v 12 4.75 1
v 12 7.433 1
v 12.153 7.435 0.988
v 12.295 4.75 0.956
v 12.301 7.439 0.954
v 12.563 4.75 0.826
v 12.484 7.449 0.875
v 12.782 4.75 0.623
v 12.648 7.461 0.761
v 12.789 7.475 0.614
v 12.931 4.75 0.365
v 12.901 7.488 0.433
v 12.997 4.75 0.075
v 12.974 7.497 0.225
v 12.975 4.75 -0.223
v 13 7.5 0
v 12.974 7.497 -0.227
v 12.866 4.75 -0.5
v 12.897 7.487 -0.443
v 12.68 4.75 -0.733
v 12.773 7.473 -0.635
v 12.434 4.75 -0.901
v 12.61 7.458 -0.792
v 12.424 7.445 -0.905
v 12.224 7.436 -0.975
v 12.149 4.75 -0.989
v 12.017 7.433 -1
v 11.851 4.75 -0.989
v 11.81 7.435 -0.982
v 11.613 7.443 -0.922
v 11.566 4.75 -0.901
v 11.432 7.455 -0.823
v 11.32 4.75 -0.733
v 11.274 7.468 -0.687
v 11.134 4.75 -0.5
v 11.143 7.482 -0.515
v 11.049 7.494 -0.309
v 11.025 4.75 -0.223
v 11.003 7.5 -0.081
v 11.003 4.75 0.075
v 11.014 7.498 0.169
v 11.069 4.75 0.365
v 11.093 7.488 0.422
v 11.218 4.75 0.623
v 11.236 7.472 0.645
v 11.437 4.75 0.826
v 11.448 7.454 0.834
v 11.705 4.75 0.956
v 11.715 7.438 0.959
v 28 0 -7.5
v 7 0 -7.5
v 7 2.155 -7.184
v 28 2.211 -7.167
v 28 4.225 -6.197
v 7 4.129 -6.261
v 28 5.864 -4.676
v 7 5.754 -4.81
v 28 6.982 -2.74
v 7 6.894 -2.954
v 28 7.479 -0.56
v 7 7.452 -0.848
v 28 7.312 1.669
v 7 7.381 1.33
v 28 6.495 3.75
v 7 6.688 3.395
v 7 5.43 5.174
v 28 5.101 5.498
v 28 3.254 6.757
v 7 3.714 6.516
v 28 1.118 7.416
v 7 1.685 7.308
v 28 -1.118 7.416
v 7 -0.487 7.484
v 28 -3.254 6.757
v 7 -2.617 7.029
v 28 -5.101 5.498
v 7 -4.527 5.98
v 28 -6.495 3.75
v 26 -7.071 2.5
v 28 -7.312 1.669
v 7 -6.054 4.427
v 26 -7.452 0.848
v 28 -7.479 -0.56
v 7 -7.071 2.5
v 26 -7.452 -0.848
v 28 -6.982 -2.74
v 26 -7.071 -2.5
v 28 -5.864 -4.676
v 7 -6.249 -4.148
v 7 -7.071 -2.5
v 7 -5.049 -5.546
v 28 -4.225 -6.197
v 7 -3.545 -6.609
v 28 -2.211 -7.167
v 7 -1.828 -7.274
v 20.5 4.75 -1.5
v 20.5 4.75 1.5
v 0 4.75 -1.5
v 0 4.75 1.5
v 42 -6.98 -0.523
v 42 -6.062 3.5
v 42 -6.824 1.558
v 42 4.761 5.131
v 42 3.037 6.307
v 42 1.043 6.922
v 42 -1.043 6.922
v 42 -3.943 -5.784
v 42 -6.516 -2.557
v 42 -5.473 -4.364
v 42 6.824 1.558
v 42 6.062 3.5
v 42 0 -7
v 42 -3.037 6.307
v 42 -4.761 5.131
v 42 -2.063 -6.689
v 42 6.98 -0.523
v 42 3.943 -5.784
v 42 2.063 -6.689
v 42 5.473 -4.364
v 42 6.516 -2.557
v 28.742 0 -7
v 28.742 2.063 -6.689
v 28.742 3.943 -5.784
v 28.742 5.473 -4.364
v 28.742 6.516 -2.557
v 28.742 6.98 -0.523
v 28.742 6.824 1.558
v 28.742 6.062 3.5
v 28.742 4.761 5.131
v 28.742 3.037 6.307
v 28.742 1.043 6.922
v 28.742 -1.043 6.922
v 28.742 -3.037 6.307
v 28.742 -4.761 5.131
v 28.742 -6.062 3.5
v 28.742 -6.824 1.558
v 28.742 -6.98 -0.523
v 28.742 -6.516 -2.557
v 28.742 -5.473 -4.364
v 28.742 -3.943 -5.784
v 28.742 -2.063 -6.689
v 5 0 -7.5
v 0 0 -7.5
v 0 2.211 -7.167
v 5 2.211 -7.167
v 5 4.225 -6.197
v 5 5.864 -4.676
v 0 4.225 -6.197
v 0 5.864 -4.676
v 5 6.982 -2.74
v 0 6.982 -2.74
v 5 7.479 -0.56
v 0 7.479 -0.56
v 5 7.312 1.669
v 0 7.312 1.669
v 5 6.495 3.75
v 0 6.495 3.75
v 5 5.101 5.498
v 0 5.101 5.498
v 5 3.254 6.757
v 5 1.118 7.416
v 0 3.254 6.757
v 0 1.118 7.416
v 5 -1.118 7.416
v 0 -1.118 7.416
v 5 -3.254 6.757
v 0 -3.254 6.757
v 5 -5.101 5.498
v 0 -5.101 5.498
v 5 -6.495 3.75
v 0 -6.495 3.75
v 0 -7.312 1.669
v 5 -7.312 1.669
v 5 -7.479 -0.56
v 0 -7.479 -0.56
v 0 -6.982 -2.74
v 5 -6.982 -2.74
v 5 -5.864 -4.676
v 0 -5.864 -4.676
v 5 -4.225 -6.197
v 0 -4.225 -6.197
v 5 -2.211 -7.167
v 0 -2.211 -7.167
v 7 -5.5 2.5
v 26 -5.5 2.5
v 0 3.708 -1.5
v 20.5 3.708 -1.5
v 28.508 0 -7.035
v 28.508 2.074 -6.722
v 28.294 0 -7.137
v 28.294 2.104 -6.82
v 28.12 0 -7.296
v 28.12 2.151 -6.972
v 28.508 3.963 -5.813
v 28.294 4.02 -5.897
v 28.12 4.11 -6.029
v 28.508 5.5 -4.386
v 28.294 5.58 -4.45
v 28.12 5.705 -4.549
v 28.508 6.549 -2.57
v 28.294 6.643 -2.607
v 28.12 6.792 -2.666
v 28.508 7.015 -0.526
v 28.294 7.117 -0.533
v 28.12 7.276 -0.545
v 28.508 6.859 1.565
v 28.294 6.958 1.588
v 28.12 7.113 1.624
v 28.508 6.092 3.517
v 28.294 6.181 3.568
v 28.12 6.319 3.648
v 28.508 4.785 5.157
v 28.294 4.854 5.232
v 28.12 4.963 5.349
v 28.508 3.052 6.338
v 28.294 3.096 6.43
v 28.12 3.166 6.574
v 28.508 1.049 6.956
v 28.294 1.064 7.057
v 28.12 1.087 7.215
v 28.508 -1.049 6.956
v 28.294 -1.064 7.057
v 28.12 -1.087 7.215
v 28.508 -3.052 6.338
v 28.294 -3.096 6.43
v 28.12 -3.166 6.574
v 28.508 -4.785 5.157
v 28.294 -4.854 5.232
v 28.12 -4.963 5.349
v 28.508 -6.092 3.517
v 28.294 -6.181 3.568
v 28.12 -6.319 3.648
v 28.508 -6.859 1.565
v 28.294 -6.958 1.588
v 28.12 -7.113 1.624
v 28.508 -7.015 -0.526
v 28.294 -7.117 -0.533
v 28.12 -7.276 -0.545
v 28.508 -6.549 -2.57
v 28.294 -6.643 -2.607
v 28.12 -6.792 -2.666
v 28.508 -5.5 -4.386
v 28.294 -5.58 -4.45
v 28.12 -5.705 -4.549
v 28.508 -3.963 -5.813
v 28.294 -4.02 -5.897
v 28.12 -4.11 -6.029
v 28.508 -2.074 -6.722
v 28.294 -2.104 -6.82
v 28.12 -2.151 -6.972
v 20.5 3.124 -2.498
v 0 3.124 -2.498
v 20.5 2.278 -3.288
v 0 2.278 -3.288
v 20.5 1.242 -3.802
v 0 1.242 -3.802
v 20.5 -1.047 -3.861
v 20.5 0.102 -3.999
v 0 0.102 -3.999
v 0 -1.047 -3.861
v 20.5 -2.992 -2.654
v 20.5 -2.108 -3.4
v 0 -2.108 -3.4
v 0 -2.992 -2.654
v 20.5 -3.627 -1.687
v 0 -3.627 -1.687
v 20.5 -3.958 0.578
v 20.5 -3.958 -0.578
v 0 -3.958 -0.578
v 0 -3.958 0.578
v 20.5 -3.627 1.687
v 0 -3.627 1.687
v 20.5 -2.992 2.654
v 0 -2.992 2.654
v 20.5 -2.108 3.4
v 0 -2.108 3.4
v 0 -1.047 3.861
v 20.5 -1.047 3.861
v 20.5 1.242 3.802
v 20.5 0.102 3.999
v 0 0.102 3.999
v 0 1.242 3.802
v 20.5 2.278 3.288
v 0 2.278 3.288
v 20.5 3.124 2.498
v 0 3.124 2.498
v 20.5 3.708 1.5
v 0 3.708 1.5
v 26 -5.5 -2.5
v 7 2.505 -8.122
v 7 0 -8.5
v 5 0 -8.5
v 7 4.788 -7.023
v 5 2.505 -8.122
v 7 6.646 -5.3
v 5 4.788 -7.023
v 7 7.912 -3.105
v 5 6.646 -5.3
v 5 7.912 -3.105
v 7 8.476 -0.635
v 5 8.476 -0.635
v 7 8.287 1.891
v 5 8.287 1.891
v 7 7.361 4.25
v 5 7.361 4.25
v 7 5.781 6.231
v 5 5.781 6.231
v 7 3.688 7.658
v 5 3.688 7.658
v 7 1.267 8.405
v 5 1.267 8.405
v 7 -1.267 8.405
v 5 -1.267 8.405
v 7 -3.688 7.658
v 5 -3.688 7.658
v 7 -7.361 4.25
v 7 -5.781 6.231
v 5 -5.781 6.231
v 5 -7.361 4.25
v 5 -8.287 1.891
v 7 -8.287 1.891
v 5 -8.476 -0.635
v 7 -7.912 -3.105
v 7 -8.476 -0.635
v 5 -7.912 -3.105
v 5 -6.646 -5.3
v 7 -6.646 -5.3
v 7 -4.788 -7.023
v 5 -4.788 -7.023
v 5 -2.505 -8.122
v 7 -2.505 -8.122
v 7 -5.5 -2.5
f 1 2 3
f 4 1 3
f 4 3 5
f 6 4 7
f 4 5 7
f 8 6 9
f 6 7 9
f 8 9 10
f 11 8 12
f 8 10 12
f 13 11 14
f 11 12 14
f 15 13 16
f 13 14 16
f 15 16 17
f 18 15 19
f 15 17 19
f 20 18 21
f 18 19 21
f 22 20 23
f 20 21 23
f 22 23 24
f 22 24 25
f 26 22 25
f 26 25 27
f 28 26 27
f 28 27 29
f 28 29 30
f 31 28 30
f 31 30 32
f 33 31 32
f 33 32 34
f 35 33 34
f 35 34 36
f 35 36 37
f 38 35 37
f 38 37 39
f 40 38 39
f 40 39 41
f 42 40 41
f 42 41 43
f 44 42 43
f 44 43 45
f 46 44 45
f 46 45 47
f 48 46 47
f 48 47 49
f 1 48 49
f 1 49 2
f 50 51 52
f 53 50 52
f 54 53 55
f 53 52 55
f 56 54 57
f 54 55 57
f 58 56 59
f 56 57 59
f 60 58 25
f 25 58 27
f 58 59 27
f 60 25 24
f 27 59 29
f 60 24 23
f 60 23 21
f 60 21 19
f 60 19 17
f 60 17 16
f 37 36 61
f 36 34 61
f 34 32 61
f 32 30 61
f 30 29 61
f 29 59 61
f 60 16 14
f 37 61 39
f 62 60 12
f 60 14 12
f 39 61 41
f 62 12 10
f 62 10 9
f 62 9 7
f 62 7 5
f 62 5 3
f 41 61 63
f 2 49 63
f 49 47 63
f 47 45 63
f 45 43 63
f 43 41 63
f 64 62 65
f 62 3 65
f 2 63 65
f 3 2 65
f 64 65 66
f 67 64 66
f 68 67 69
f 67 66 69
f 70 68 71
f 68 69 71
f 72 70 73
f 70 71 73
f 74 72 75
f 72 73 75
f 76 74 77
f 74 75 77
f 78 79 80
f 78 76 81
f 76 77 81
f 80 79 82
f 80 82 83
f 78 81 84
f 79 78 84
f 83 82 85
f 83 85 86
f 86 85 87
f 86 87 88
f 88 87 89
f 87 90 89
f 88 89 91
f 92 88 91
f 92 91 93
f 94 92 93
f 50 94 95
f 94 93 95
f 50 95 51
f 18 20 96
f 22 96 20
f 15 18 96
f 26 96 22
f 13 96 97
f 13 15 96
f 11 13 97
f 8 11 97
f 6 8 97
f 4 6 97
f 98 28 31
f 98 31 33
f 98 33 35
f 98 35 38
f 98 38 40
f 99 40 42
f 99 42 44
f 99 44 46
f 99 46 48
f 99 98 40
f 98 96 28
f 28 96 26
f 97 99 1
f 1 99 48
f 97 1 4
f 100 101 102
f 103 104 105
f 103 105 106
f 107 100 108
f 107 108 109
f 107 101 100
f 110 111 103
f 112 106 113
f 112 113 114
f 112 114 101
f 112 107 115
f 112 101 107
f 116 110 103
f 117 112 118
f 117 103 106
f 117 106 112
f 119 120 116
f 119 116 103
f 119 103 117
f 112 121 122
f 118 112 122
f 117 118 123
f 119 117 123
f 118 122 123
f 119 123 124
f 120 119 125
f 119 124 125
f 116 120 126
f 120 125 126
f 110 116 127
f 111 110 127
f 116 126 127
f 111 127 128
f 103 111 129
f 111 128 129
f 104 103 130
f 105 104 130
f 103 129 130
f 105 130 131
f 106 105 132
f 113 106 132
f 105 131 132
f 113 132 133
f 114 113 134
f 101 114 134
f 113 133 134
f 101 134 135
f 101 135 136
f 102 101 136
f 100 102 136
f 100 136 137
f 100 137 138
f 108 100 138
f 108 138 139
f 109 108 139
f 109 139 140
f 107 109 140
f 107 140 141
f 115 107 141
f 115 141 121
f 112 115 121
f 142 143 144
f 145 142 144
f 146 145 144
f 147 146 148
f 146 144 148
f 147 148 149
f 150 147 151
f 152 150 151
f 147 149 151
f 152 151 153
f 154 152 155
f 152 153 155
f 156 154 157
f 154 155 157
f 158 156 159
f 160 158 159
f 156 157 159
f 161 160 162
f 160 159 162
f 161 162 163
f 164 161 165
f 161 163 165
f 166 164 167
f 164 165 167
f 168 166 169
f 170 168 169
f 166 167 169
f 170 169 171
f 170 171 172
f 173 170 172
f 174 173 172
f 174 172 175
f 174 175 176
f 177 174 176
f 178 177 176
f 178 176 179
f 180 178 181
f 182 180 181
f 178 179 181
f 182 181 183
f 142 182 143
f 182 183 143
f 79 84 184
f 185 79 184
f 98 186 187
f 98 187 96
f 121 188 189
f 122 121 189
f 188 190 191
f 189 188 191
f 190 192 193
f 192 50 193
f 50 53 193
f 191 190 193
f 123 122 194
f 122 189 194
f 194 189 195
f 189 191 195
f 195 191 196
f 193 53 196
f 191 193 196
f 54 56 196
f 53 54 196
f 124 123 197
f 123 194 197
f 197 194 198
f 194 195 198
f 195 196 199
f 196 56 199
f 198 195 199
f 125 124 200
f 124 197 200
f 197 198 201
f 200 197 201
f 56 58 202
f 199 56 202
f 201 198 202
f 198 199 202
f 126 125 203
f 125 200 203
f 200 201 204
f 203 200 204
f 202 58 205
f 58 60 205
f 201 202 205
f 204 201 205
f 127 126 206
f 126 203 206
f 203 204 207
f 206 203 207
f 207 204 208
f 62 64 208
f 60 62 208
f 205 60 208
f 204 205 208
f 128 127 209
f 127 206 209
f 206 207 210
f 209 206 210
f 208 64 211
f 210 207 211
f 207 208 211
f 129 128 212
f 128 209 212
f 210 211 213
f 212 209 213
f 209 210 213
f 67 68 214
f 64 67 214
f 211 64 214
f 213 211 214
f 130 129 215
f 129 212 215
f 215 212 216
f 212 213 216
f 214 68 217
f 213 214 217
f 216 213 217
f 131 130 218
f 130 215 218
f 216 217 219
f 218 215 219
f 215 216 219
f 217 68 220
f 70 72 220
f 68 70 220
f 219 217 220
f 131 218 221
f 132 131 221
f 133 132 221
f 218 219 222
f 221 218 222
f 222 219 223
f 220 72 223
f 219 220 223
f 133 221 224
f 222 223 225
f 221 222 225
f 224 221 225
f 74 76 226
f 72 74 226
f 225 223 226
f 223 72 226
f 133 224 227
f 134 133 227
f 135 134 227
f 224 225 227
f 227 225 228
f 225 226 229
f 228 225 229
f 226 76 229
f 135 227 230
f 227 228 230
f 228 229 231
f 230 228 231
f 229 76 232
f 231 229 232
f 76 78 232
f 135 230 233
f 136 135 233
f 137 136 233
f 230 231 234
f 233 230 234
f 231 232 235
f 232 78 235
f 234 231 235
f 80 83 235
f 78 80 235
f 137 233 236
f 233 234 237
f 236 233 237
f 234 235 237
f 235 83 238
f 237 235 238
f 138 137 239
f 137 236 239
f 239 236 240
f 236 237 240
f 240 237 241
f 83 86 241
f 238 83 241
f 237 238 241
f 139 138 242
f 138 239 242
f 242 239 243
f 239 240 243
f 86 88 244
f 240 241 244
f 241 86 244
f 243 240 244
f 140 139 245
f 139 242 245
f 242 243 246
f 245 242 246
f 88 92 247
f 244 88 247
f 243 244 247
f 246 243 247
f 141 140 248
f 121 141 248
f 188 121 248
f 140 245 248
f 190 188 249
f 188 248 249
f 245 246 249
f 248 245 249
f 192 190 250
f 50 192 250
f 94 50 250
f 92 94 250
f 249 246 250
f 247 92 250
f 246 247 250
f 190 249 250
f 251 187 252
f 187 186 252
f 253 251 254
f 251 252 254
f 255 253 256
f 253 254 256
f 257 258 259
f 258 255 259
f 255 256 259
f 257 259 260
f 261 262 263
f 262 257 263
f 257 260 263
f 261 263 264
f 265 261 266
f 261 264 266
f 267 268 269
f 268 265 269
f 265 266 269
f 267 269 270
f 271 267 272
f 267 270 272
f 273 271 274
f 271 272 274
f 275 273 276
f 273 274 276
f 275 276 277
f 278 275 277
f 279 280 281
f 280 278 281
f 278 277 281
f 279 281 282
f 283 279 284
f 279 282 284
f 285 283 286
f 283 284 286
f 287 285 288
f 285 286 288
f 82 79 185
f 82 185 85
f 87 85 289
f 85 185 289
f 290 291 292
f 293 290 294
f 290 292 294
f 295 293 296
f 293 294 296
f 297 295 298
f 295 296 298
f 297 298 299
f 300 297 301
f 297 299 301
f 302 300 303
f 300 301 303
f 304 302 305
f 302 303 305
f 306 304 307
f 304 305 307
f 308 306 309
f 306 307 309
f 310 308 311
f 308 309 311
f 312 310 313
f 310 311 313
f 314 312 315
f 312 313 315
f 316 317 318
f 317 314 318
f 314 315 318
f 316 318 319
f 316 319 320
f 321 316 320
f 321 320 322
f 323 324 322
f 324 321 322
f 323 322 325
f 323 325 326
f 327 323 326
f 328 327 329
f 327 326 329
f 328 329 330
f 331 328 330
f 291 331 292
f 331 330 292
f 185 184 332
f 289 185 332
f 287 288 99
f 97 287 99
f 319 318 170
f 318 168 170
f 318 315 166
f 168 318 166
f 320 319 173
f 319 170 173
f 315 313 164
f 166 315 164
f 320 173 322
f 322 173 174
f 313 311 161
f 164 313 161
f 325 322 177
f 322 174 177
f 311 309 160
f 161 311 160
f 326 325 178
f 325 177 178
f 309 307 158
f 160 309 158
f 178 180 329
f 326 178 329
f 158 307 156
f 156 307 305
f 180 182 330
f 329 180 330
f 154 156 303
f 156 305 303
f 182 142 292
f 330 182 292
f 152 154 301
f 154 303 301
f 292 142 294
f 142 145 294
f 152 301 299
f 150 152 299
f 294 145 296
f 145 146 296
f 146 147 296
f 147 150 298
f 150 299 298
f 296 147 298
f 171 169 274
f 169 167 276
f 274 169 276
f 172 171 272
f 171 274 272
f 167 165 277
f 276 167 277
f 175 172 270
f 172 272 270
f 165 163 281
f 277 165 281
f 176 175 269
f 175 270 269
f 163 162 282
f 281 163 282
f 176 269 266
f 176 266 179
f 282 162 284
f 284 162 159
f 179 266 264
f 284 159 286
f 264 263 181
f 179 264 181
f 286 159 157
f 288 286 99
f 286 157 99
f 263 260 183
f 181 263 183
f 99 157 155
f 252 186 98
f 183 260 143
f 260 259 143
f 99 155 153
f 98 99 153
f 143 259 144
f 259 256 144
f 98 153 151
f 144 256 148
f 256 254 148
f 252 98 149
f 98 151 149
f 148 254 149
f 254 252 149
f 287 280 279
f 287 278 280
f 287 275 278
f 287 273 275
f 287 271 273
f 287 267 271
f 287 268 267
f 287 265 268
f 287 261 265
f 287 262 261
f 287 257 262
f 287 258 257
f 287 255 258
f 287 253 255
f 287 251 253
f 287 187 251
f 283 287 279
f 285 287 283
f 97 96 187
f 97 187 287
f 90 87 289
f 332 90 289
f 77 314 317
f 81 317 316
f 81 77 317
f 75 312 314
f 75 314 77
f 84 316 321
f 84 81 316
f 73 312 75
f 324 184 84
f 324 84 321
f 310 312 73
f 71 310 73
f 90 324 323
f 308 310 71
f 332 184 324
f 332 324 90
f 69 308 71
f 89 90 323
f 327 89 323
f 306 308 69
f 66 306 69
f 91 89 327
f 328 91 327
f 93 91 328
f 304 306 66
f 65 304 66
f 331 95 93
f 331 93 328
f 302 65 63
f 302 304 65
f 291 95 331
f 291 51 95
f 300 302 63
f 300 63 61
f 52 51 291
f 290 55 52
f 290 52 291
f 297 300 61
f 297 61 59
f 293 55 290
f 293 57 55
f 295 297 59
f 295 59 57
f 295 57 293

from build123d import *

# Parameters (mm, degrees)
SKETCH1_R           = 7.5
BOSS_EXTRUDE1_DEPTH = 5
SKETCH2_R           = 8.5
BOSS_EXTRUDE2_DEPTH = 2
SKETCH3_R           = 7.5
BOSS_EXTRUDE3_DEPTH = 35
SKETCH4_R           = 4
CUT_EXTRUDE1_DEPTH  = 20.5
SKETCH6_W           = 3
SKETCH6_H           = 1.5
CUT_EXTRUDE2_DEPTH  = 20.5
CUT_EXTRUDE3_REACH  = 47.741
SKETCH7_R           = 1
CUT_EXTRUDE5_START  = -35
SKETCH8_W           = 5
SKETCH8_H           = 4
CUT_EXTRUDE5_DEPTH  = 19
CUT_EXTRUDE6_START  = -14
SKETCH9_R           = 7.5
SKETCH9_R_2         = 7
CUT_EXTRUDE6_DEPTH  = 14
FILLET1_R           = 0.8


with BuildPart() as part:
    # Sketch1 → Boss-Extrude1 (new body)
    with BuildSketch(Plane(origin=(0, 0, 0), x_dir=(0, 0, -1), z_dir=(1, 0, 0))):
        Circle(SKETCH1_R)
    extrude(amount=BOSS_EXTRUDE1_DEPTH)

    # Sketch2 → Boss-Extrude2 (add)
    with BuildSketch(Plane(origin=(5, 0, 0), x_dir=(0, 0, -1), z_dir=(1, 0, 0))):
        Circle(SKETCH2_R)
    extrude(amount=BOSS_EXTRUDE2_DEPTH)

    # Sketch3 → Boss-Extrude3 (add)
    with BuildSketch(Plane(origin=(7, 0, 0), x_dir=(0, 0, -1), z_dir=(1, 0, 0))):
        Circle(SKETCH3_R)
    extrude(amount=BOSS_EXTRUDE3_DEPTH)

    # Sketch4 → Cut-Extrude1 (cut)
    with BuildSketch(Plane.ZY):
        Circle(SKETCH4_R)
    extrude(amount=-CUT_EXTRUDE1_DEPTH, mode=Mode.SUBTRACT)

    # Sketch6 → Cut-Extrude2 (cut)
    with BuildSketch(Plane.ZY):
        with Locations((0, 4)):
            Rectangle(SKETCH6_W, SKETCH6_H)
    extrude(amount=-CUT_EXTRUDE2_DEPTH, mode=Mode.SUBTRACT)

    # Sketch7 → Cut-Extrude3 (cut, up to next)
    with BuildSketch(Plane(origin=(0, 7.5, 0), x_dir=(1, 0, 0), z_dir=(0, 1, 0)), mode=Mode.PRIVATE) as cut_extrude3_sk1:
        with Locations(Location((12, 0, 0), (0, 0, 270))):
            Circle(SKETCH7_R)
    cut_extrude3_tool1 = extrude(cut_extrude3_sk1.sketch, amount=-CUT_EXTRUDE3_REACH, mode=Mode.PRIVATE) & part.part
    add(cut_extrude3_tool1.solids().sort_by_distance((12, 7.5, 0))[0], mode=Mode.SUBTRACT)

    # Sketch8 → Cut-Extrude5 (cut)
    with BuildSketch(Plane(origin=(42, 0, 0), x_dir=(0, 0, -1), z_dir=(1, 0, 0)).offset(CUT_EXTRUDE5_START)):
        with Locations((0, -7.5)):
            Rectangle(SKETCH8_W, SKETCH8_H)
    extrude(amount=CUT_EXTRUDE5_DEPTH, mode=Mode.SUBTRACT)

    # Sketch9 → Cut-Extrude6 (cut)
    with BuildSketch(Plane(origin=(42, 0, 0), x_dir=(0, 0, -1), z_dir=(1, 0, 0)).offset(CUT_EXTRUDE6_START)):
        with Locations(Location((0, 0, 0), (0, 0, 250.528779366))):
            Circle(SKETCH9_R)
        Circle(SKETCH9_R_2, mode=Mode.SUBTRACT)
    extrude(amount=CUT_EXTRUDE6_DEPTH, mode=Mode.SUBTRACT)

    # Fillet1
    # the kernel refuses this fillet: 0.8 mm, written as the material it adds along each edge
    with BuildSketch(Plane(origin=(28, 0, 0), x_dir=(0, 0, -1), z_dir=(0, -1, 0))) as fillet1_piece_1:
        with BuildLine():
            CenterArc((7.8, 0.741619849), FILLET1_R, 180, 67.975687163)
            Line((7, 0.741619849), (6.984, 0.741619849))
            Line((6.984, 0.741619849), (6.984, 0))
            Line((6.984, 0), (7, -0.016))
            ThreePointArc((7, -0.016), (7.25, -0.016), (7.494, -0.014832397))
            Line((7.494, -0.014832397), (7.5, 0))
        make_face()
    revolve(axis=Axis((28, 0, 0), (1, 0, 0)))


solid = part.part
